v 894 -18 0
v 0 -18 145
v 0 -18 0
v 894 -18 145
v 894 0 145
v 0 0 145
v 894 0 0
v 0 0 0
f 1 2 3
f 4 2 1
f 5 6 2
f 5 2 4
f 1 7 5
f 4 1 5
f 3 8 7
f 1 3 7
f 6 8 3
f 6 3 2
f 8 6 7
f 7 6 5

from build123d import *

# Parameters (mm, degrees)
F0_W     = 51.9615262747
F0_H     = 41.4970368147
F1_DEPTH = 18
F2_DEPTH = 145
F3_DEPTH = 896
F4_DEPTH = 896
F5_DEPTH = 2


with BuildPart() as f1:
    # F0 (on Front) → F1 (new body)
    with BuildSketch(Plane.XZ):
        with Locations((25.9807631373, 20.7485184073)):
            Rectangle(F0_W, F0_H)
    extrude(amount=F1_DEPTH)

    # F2 (add): a face of the model
    f2_faces = [f1.faces().sort_by_distance(p)[0] for p in [
        (25.9807631373, -9, 0),
    ]]
    extrude(f2_faces, amount=-F2_DEPTH)

    # F3 (add): a face of the model
    f3_faces = [f1.faces().sort_by_distance(p)[0] for p in [
        (0, -9, 72.5),
    ]]
    extrude(f3_faces, amount=-F3_DEPTH)

    # F4 (add): a face of the model
    f4_faces = [f1.faces().sort_by_distance(p)[0] for p in [
        (0, -9, 72.5),
    ]]
    extrude(f4_faces, amount=-F4_DEPTH)

    # F5 (cut): a face of the model
    f5_faces = [f1.faces().sort_by_distance(p)[0] for p in [
        (896, -9, 72.5),
    ]]
    extrude(f5_faces, amount=-F5_DEPTH, mode=Mode.SUBTRACT)


solid = f1.part
